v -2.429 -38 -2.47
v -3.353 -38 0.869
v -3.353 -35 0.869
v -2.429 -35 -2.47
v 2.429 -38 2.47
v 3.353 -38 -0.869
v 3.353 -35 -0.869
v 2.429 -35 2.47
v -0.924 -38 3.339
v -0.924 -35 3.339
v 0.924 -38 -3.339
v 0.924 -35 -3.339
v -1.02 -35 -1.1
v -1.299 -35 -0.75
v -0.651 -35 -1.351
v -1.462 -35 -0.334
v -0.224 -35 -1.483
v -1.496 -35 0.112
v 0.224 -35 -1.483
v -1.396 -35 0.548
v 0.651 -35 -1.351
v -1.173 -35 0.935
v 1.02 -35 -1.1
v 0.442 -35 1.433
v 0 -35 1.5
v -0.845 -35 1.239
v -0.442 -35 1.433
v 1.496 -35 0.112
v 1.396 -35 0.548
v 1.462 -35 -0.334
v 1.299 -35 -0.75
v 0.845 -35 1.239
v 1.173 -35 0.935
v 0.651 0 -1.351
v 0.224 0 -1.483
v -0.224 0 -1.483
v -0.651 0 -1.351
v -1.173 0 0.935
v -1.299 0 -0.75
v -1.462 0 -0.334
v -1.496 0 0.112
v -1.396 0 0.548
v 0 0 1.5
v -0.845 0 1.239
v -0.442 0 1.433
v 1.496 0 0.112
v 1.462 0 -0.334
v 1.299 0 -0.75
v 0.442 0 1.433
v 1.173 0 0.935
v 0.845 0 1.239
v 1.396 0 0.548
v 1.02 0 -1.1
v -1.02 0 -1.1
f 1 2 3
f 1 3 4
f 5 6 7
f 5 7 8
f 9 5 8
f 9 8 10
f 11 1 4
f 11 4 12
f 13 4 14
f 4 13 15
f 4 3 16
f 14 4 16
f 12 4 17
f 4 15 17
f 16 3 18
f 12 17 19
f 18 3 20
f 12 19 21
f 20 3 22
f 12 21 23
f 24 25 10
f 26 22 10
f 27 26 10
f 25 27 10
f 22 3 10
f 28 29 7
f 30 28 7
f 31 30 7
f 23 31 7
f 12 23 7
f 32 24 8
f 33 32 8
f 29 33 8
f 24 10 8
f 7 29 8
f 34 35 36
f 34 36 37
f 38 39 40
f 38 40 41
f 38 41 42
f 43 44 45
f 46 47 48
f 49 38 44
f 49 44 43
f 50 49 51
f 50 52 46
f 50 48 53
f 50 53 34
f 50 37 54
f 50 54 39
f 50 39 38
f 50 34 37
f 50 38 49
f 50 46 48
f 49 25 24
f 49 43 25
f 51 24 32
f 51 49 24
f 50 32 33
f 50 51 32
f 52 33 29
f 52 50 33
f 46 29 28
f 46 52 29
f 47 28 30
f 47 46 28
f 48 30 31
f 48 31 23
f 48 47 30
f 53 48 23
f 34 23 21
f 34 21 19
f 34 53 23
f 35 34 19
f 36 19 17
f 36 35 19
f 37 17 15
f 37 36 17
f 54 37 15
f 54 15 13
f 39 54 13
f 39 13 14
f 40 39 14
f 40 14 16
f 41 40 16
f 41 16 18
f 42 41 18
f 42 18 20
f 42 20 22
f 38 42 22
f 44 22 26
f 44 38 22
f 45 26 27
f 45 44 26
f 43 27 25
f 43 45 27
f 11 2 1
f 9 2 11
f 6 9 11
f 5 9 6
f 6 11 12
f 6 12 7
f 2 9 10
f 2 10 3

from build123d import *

# Parameters (mm, degrees)
BOSS_EXTRU_1_DEPTH = 3
ESQUISSE2_W        = 1.5
ESQUISSE2_H        = 35


with BuildPart() as part:
    # Esquisse1 → Boss.-Extru.1 (new body)
    with BuildSketch(Plane.XZ.offset(38)):
        Polygon((0.924188604, -3.338543908), (3.353358138, -0.868901145), (2.429169534, 2.469642763), (-0.924188604, 3.338543908), (-3.353358138, 0.868901145), (-2.429169534, -2.469642763), align=None)
    extrude(amount=-BOSS_EXTRU_1_DEPTH)

    # Esquisse2 → Révolution1 (revolve)
    with BuildSketch(Plane(origin=(0, 0, 0), x_dir=(-1, 0, 0), z_dir=(0, 0, -1)), mode=Mode.PRIVATE) as r_volution1_sk:
        with Locations((-0.75, -17.5)):
            Rectangle(ESQUISSE2_W, ESQUISSE2_H)
    revolve(r_volution1_sk.sketch.rotate(Axis((0, -35, 0), (0, 1, 0)), 270), axis=Axis((0, -35, 0), (0, 1, 0)))


solid = part.part
